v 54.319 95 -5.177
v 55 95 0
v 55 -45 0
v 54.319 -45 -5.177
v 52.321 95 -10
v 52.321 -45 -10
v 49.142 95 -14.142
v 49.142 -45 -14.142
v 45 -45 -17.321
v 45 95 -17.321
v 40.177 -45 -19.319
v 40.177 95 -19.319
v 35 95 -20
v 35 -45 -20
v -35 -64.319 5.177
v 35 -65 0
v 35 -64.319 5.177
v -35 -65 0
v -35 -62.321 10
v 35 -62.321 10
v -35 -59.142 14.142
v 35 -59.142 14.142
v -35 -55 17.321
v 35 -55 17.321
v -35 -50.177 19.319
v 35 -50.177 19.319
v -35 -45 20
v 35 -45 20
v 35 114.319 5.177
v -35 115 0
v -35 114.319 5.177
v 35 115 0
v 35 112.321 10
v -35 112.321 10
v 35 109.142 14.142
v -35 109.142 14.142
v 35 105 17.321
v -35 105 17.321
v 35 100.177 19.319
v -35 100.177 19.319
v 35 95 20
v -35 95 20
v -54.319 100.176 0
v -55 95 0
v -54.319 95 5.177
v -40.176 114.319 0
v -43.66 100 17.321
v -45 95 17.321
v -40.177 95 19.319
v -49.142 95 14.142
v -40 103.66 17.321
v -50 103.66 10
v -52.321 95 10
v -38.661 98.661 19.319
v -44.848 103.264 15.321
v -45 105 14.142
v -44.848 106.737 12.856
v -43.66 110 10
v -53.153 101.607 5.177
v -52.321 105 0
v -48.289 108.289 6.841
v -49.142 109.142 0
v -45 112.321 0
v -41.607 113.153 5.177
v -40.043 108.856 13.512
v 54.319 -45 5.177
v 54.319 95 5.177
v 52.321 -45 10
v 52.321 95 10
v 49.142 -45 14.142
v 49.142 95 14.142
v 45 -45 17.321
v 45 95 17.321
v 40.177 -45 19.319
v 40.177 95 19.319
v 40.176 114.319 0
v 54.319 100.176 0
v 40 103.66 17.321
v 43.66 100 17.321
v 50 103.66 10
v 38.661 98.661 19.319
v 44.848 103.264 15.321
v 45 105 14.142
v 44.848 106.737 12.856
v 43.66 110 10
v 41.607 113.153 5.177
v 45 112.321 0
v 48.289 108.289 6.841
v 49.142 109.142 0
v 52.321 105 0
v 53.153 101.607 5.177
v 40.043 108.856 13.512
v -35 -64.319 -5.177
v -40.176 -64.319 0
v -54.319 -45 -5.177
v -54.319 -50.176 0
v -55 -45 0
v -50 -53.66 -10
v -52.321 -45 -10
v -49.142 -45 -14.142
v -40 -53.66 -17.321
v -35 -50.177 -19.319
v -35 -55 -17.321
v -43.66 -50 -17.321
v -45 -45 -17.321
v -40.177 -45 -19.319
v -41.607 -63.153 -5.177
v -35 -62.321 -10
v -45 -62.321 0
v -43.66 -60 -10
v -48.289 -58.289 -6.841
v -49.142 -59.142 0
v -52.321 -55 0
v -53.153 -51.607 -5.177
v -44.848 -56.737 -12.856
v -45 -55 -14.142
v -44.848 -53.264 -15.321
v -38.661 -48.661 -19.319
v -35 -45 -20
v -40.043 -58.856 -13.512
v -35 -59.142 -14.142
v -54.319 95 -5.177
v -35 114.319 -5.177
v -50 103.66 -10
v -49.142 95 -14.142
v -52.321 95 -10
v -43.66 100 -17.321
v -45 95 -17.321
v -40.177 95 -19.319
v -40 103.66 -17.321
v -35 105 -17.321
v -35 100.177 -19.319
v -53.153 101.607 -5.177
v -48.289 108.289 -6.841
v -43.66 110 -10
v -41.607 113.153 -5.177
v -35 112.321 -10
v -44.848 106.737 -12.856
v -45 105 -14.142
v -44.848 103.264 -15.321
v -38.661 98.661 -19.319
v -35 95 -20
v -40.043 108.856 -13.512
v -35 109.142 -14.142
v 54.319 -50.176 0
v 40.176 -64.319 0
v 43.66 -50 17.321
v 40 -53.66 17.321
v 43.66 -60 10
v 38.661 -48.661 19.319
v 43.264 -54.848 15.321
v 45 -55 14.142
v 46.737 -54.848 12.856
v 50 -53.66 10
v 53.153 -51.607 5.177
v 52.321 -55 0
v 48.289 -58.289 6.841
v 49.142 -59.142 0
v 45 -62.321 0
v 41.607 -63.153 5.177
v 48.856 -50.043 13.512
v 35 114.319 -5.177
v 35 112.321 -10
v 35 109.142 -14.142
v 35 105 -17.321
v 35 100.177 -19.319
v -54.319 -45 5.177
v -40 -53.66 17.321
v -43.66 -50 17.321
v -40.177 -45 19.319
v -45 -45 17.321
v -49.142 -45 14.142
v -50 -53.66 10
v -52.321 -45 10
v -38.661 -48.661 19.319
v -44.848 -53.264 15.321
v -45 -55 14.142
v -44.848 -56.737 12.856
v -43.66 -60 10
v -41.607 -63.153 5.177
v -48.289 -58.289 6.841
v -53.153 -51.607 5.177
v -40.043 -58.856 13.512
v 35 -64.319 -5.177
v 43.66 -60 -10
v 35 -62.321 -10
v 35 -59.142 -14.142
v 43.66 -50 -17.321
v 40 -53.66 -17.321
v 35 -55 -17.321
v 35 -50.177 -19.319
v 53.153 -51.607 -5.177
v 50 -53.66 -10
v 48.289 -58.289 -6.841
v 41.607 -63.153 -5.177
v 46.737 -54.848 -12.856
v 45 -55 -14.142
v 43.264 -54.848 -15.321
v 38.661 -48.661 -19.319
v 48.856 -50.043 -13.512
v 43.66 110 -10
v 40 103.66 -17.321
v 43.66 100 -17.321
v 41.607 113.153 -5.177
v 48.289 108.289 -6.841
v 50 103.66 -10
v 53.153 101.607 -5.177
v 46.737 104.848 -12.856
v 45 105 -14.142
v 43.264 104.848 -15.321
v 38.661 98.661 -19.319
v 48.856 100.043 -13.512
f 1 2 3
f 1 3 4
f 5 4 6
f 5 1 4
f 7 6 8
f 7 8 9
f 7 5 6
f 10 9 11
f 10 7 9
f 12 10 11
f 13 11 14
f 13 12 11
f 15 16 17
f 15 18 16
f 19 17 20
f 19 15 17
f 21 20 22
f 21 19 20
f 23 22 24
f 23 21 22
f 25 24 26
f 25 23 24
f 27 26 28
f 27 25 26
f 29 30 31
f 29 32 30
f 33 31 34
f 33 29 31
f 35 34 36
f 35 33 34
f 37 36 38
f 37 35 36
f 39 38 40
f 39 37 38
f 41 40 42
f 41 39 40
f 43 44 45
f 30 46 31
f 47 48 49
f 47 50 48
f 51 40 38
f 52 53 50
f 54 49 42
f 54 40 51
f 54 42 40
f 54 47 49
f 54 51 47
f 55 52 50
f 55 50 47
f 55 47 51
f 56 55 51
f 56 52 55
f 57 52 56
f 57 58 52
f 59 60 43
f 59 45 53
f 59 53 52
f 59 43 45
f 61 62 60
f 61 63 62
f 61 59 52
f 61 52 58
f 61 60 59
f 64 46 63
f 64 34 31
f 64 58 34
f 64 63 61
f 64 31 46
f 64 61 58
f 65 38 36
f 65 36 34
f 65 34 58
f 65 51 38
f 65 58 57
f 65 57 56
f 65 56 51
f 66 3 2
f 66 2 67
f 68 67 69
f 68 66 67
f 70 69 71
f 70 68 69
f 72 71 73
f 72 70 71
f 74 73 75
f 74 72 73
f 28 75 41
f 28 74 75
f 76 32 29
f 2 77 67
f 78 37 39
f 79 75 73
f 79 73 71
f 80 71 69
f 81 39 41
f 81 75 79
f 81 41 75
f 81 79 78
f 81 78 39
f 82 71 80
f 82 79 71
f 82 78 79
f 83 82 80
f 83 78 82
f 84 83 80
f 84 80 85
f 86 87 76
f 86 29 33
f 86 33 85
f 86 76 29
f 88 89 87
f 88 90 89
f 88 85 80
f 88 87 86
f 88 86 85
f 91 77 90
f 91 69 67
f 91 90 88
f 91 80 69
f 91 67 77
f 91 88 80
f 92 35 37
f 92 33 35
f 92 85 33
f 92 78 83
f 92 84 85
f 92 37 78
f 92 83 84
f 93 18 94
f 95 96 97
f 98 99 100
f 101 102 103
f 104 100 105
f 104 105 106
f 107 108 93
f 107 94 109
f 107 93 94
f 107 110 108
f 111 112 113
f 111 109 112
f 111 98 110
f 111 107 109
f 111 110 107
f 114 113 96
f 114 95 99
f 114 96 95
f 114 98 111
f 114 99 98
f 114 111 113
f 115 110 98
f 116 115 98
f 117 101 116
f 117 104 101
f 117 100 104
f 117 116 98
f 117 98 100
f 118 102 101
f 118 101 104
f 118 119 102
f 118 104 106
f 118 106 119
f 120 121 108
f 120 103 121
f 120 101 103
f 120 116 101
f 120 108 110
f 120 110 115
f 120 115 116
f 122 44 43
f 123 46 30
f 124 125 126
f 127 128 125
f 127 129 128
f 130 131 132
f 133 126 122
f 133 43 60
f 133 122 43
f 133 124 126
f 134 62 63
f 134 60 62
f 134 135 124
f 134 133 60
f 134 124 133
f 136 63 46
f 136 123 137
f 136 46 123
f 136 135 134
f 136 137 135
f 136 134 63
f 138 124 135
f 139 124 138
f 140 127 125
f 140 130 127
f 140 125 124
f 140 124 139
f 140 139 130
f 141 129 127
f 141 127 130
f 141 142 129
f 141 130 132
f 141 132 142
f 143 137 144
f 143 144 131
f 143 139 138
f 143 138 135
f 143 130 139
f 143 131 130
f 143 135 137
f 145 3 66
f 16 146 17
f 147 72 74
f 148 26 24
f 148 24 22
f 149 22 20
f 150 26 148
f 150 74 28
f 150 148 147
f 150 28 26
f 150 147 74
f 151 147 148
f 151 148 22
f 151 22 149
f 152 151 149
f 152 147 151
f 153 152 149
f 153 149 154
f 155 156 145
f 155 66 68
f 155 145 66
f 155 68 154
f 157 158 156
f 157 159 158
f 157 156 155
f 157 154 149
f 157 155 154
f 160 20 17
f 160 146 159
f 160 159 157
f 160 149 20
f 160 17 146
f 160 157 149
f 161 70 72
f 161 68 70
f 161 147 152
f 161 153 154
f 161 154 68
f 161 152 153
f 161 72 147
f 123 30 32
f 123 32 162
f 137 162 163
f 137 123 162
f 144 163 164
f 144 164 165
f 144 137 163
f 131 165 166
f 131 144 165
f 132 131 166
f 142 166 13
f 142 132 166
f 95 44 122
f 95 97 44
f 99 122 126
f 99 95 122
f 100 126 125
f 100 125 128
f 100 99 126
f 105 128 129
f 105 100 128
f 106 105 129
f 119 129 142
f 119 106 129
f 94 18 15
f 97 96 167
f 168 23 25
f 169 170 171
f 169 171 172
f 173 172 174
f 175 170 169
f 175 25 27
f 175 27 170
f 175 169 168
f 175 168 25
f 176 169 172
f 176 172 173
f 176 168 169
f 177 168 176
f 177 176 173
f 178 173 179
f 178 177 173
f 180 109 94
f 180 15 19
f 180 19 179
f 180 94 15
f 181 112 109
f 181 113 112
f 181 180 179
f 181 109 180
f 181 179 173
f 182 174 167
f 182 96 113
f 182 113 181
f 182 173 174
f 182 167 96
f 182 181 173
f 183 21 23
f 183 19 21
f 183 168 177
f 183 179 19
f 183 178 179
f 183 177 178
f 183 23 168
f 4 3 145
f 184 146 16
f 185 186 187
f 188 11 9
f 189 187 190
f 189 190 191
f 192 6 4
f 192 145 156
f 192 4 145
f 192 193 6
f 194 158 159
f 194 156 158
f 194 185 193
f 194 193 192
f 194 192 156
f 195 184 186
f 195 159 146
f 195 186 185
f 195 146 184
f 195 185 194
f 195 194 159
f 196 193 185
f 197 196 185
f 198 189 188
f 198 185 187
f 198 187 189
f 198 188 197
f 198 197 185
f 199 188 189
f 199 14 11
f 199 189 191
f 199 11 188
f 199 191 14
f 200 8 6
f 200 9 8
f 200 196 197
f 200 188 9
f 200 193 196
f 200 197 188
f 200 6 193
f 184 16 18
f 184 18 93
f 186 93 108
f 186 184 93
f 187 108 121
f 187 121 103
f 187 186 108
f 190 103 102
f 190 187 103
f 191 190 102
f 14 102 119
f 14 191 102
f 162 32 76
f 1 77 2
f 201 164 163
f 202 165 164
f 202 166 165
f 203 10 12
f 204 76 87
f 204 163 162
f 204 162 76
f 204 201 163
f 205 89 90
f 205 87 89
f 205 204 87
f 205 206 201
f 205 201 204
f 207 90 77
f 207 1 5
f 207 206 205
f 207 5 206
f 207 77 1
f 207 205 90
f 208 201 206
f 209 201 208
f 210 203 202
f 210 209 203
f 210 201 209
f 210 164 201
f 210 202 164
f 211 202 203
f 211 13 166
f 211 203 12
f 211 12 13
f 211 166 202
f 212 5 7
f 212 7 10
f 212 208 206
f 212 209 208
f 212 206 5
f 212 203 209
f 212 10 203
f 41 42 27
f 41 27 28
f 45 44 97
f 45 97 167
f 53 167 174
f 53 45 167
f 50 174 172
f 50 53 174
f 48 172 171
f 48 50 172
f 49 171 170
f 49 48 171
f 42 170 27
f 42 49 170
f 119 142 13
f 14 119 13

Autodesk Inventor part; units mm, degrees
ref_plane "XZ Plane" through (0, 0, 0) normal (0, 1, 0) x (-1, 0, 0)
ref_plane "XY Plane" through (0, 0, 0) normal (0, 0, 1) x (1, 0, 0)
sketch "草圖1" plane through (0, 0, 0) normal (0, 0, 1) x (1, 0, 0)
  line L0 (-55, 115) -> (55, 115)
  line L1 (55, 115) -> (55, -65)
  line L2 (55, -65) -> (-55, -65)
  line L3 (-55, -65) -> (-55, 115)
  line L4 (-55, 115) -> (55, -65) construction
  line L5 (55, 115) -> (-55, -65) construction
  line L6 (0, 0) -> (0, -31.0112) construction
  line L7 (0, 151) -> (0, -101) projected
  point P0 (0, 25)
  point P1 (0, 25)
  dimension "d0" = 110
  dimension "d1" = 180
  dimension "d7" = 25
extrude "擠出1" add sketch "草圖1" along normal mid plane 40
fillet "圓角1" radius 20 4 edges at (55, 115, 0) (-55, 115, 0) (55, -65, 0) (-55, -65, 0)
fillet "圓角2" radius 20 16 edges at (49.1421, 109.1421, 20) (0, 115, 20) (-49.1421, 109.1421, 20) (-55, 25, 20) (-49.1421, -59.1421, 20) (0, -65, 20) (49.1421, -59.1421, 20) (55, 25, 20) (0, 115, -20) (-49.1421, 109.1421, -20) (-55, 25, -20) (-49.1421, -59.1421, -20) (0, -65, -20) (49.1421, -59.1421, -20) (55, 25, -20) (49.1421, 109.1421, -20)
ref_plane "工作平面1" through (-12, 0, 0) normal (1, 0, 0) x (0, 1, 0)
properties part number "模擬商品"
